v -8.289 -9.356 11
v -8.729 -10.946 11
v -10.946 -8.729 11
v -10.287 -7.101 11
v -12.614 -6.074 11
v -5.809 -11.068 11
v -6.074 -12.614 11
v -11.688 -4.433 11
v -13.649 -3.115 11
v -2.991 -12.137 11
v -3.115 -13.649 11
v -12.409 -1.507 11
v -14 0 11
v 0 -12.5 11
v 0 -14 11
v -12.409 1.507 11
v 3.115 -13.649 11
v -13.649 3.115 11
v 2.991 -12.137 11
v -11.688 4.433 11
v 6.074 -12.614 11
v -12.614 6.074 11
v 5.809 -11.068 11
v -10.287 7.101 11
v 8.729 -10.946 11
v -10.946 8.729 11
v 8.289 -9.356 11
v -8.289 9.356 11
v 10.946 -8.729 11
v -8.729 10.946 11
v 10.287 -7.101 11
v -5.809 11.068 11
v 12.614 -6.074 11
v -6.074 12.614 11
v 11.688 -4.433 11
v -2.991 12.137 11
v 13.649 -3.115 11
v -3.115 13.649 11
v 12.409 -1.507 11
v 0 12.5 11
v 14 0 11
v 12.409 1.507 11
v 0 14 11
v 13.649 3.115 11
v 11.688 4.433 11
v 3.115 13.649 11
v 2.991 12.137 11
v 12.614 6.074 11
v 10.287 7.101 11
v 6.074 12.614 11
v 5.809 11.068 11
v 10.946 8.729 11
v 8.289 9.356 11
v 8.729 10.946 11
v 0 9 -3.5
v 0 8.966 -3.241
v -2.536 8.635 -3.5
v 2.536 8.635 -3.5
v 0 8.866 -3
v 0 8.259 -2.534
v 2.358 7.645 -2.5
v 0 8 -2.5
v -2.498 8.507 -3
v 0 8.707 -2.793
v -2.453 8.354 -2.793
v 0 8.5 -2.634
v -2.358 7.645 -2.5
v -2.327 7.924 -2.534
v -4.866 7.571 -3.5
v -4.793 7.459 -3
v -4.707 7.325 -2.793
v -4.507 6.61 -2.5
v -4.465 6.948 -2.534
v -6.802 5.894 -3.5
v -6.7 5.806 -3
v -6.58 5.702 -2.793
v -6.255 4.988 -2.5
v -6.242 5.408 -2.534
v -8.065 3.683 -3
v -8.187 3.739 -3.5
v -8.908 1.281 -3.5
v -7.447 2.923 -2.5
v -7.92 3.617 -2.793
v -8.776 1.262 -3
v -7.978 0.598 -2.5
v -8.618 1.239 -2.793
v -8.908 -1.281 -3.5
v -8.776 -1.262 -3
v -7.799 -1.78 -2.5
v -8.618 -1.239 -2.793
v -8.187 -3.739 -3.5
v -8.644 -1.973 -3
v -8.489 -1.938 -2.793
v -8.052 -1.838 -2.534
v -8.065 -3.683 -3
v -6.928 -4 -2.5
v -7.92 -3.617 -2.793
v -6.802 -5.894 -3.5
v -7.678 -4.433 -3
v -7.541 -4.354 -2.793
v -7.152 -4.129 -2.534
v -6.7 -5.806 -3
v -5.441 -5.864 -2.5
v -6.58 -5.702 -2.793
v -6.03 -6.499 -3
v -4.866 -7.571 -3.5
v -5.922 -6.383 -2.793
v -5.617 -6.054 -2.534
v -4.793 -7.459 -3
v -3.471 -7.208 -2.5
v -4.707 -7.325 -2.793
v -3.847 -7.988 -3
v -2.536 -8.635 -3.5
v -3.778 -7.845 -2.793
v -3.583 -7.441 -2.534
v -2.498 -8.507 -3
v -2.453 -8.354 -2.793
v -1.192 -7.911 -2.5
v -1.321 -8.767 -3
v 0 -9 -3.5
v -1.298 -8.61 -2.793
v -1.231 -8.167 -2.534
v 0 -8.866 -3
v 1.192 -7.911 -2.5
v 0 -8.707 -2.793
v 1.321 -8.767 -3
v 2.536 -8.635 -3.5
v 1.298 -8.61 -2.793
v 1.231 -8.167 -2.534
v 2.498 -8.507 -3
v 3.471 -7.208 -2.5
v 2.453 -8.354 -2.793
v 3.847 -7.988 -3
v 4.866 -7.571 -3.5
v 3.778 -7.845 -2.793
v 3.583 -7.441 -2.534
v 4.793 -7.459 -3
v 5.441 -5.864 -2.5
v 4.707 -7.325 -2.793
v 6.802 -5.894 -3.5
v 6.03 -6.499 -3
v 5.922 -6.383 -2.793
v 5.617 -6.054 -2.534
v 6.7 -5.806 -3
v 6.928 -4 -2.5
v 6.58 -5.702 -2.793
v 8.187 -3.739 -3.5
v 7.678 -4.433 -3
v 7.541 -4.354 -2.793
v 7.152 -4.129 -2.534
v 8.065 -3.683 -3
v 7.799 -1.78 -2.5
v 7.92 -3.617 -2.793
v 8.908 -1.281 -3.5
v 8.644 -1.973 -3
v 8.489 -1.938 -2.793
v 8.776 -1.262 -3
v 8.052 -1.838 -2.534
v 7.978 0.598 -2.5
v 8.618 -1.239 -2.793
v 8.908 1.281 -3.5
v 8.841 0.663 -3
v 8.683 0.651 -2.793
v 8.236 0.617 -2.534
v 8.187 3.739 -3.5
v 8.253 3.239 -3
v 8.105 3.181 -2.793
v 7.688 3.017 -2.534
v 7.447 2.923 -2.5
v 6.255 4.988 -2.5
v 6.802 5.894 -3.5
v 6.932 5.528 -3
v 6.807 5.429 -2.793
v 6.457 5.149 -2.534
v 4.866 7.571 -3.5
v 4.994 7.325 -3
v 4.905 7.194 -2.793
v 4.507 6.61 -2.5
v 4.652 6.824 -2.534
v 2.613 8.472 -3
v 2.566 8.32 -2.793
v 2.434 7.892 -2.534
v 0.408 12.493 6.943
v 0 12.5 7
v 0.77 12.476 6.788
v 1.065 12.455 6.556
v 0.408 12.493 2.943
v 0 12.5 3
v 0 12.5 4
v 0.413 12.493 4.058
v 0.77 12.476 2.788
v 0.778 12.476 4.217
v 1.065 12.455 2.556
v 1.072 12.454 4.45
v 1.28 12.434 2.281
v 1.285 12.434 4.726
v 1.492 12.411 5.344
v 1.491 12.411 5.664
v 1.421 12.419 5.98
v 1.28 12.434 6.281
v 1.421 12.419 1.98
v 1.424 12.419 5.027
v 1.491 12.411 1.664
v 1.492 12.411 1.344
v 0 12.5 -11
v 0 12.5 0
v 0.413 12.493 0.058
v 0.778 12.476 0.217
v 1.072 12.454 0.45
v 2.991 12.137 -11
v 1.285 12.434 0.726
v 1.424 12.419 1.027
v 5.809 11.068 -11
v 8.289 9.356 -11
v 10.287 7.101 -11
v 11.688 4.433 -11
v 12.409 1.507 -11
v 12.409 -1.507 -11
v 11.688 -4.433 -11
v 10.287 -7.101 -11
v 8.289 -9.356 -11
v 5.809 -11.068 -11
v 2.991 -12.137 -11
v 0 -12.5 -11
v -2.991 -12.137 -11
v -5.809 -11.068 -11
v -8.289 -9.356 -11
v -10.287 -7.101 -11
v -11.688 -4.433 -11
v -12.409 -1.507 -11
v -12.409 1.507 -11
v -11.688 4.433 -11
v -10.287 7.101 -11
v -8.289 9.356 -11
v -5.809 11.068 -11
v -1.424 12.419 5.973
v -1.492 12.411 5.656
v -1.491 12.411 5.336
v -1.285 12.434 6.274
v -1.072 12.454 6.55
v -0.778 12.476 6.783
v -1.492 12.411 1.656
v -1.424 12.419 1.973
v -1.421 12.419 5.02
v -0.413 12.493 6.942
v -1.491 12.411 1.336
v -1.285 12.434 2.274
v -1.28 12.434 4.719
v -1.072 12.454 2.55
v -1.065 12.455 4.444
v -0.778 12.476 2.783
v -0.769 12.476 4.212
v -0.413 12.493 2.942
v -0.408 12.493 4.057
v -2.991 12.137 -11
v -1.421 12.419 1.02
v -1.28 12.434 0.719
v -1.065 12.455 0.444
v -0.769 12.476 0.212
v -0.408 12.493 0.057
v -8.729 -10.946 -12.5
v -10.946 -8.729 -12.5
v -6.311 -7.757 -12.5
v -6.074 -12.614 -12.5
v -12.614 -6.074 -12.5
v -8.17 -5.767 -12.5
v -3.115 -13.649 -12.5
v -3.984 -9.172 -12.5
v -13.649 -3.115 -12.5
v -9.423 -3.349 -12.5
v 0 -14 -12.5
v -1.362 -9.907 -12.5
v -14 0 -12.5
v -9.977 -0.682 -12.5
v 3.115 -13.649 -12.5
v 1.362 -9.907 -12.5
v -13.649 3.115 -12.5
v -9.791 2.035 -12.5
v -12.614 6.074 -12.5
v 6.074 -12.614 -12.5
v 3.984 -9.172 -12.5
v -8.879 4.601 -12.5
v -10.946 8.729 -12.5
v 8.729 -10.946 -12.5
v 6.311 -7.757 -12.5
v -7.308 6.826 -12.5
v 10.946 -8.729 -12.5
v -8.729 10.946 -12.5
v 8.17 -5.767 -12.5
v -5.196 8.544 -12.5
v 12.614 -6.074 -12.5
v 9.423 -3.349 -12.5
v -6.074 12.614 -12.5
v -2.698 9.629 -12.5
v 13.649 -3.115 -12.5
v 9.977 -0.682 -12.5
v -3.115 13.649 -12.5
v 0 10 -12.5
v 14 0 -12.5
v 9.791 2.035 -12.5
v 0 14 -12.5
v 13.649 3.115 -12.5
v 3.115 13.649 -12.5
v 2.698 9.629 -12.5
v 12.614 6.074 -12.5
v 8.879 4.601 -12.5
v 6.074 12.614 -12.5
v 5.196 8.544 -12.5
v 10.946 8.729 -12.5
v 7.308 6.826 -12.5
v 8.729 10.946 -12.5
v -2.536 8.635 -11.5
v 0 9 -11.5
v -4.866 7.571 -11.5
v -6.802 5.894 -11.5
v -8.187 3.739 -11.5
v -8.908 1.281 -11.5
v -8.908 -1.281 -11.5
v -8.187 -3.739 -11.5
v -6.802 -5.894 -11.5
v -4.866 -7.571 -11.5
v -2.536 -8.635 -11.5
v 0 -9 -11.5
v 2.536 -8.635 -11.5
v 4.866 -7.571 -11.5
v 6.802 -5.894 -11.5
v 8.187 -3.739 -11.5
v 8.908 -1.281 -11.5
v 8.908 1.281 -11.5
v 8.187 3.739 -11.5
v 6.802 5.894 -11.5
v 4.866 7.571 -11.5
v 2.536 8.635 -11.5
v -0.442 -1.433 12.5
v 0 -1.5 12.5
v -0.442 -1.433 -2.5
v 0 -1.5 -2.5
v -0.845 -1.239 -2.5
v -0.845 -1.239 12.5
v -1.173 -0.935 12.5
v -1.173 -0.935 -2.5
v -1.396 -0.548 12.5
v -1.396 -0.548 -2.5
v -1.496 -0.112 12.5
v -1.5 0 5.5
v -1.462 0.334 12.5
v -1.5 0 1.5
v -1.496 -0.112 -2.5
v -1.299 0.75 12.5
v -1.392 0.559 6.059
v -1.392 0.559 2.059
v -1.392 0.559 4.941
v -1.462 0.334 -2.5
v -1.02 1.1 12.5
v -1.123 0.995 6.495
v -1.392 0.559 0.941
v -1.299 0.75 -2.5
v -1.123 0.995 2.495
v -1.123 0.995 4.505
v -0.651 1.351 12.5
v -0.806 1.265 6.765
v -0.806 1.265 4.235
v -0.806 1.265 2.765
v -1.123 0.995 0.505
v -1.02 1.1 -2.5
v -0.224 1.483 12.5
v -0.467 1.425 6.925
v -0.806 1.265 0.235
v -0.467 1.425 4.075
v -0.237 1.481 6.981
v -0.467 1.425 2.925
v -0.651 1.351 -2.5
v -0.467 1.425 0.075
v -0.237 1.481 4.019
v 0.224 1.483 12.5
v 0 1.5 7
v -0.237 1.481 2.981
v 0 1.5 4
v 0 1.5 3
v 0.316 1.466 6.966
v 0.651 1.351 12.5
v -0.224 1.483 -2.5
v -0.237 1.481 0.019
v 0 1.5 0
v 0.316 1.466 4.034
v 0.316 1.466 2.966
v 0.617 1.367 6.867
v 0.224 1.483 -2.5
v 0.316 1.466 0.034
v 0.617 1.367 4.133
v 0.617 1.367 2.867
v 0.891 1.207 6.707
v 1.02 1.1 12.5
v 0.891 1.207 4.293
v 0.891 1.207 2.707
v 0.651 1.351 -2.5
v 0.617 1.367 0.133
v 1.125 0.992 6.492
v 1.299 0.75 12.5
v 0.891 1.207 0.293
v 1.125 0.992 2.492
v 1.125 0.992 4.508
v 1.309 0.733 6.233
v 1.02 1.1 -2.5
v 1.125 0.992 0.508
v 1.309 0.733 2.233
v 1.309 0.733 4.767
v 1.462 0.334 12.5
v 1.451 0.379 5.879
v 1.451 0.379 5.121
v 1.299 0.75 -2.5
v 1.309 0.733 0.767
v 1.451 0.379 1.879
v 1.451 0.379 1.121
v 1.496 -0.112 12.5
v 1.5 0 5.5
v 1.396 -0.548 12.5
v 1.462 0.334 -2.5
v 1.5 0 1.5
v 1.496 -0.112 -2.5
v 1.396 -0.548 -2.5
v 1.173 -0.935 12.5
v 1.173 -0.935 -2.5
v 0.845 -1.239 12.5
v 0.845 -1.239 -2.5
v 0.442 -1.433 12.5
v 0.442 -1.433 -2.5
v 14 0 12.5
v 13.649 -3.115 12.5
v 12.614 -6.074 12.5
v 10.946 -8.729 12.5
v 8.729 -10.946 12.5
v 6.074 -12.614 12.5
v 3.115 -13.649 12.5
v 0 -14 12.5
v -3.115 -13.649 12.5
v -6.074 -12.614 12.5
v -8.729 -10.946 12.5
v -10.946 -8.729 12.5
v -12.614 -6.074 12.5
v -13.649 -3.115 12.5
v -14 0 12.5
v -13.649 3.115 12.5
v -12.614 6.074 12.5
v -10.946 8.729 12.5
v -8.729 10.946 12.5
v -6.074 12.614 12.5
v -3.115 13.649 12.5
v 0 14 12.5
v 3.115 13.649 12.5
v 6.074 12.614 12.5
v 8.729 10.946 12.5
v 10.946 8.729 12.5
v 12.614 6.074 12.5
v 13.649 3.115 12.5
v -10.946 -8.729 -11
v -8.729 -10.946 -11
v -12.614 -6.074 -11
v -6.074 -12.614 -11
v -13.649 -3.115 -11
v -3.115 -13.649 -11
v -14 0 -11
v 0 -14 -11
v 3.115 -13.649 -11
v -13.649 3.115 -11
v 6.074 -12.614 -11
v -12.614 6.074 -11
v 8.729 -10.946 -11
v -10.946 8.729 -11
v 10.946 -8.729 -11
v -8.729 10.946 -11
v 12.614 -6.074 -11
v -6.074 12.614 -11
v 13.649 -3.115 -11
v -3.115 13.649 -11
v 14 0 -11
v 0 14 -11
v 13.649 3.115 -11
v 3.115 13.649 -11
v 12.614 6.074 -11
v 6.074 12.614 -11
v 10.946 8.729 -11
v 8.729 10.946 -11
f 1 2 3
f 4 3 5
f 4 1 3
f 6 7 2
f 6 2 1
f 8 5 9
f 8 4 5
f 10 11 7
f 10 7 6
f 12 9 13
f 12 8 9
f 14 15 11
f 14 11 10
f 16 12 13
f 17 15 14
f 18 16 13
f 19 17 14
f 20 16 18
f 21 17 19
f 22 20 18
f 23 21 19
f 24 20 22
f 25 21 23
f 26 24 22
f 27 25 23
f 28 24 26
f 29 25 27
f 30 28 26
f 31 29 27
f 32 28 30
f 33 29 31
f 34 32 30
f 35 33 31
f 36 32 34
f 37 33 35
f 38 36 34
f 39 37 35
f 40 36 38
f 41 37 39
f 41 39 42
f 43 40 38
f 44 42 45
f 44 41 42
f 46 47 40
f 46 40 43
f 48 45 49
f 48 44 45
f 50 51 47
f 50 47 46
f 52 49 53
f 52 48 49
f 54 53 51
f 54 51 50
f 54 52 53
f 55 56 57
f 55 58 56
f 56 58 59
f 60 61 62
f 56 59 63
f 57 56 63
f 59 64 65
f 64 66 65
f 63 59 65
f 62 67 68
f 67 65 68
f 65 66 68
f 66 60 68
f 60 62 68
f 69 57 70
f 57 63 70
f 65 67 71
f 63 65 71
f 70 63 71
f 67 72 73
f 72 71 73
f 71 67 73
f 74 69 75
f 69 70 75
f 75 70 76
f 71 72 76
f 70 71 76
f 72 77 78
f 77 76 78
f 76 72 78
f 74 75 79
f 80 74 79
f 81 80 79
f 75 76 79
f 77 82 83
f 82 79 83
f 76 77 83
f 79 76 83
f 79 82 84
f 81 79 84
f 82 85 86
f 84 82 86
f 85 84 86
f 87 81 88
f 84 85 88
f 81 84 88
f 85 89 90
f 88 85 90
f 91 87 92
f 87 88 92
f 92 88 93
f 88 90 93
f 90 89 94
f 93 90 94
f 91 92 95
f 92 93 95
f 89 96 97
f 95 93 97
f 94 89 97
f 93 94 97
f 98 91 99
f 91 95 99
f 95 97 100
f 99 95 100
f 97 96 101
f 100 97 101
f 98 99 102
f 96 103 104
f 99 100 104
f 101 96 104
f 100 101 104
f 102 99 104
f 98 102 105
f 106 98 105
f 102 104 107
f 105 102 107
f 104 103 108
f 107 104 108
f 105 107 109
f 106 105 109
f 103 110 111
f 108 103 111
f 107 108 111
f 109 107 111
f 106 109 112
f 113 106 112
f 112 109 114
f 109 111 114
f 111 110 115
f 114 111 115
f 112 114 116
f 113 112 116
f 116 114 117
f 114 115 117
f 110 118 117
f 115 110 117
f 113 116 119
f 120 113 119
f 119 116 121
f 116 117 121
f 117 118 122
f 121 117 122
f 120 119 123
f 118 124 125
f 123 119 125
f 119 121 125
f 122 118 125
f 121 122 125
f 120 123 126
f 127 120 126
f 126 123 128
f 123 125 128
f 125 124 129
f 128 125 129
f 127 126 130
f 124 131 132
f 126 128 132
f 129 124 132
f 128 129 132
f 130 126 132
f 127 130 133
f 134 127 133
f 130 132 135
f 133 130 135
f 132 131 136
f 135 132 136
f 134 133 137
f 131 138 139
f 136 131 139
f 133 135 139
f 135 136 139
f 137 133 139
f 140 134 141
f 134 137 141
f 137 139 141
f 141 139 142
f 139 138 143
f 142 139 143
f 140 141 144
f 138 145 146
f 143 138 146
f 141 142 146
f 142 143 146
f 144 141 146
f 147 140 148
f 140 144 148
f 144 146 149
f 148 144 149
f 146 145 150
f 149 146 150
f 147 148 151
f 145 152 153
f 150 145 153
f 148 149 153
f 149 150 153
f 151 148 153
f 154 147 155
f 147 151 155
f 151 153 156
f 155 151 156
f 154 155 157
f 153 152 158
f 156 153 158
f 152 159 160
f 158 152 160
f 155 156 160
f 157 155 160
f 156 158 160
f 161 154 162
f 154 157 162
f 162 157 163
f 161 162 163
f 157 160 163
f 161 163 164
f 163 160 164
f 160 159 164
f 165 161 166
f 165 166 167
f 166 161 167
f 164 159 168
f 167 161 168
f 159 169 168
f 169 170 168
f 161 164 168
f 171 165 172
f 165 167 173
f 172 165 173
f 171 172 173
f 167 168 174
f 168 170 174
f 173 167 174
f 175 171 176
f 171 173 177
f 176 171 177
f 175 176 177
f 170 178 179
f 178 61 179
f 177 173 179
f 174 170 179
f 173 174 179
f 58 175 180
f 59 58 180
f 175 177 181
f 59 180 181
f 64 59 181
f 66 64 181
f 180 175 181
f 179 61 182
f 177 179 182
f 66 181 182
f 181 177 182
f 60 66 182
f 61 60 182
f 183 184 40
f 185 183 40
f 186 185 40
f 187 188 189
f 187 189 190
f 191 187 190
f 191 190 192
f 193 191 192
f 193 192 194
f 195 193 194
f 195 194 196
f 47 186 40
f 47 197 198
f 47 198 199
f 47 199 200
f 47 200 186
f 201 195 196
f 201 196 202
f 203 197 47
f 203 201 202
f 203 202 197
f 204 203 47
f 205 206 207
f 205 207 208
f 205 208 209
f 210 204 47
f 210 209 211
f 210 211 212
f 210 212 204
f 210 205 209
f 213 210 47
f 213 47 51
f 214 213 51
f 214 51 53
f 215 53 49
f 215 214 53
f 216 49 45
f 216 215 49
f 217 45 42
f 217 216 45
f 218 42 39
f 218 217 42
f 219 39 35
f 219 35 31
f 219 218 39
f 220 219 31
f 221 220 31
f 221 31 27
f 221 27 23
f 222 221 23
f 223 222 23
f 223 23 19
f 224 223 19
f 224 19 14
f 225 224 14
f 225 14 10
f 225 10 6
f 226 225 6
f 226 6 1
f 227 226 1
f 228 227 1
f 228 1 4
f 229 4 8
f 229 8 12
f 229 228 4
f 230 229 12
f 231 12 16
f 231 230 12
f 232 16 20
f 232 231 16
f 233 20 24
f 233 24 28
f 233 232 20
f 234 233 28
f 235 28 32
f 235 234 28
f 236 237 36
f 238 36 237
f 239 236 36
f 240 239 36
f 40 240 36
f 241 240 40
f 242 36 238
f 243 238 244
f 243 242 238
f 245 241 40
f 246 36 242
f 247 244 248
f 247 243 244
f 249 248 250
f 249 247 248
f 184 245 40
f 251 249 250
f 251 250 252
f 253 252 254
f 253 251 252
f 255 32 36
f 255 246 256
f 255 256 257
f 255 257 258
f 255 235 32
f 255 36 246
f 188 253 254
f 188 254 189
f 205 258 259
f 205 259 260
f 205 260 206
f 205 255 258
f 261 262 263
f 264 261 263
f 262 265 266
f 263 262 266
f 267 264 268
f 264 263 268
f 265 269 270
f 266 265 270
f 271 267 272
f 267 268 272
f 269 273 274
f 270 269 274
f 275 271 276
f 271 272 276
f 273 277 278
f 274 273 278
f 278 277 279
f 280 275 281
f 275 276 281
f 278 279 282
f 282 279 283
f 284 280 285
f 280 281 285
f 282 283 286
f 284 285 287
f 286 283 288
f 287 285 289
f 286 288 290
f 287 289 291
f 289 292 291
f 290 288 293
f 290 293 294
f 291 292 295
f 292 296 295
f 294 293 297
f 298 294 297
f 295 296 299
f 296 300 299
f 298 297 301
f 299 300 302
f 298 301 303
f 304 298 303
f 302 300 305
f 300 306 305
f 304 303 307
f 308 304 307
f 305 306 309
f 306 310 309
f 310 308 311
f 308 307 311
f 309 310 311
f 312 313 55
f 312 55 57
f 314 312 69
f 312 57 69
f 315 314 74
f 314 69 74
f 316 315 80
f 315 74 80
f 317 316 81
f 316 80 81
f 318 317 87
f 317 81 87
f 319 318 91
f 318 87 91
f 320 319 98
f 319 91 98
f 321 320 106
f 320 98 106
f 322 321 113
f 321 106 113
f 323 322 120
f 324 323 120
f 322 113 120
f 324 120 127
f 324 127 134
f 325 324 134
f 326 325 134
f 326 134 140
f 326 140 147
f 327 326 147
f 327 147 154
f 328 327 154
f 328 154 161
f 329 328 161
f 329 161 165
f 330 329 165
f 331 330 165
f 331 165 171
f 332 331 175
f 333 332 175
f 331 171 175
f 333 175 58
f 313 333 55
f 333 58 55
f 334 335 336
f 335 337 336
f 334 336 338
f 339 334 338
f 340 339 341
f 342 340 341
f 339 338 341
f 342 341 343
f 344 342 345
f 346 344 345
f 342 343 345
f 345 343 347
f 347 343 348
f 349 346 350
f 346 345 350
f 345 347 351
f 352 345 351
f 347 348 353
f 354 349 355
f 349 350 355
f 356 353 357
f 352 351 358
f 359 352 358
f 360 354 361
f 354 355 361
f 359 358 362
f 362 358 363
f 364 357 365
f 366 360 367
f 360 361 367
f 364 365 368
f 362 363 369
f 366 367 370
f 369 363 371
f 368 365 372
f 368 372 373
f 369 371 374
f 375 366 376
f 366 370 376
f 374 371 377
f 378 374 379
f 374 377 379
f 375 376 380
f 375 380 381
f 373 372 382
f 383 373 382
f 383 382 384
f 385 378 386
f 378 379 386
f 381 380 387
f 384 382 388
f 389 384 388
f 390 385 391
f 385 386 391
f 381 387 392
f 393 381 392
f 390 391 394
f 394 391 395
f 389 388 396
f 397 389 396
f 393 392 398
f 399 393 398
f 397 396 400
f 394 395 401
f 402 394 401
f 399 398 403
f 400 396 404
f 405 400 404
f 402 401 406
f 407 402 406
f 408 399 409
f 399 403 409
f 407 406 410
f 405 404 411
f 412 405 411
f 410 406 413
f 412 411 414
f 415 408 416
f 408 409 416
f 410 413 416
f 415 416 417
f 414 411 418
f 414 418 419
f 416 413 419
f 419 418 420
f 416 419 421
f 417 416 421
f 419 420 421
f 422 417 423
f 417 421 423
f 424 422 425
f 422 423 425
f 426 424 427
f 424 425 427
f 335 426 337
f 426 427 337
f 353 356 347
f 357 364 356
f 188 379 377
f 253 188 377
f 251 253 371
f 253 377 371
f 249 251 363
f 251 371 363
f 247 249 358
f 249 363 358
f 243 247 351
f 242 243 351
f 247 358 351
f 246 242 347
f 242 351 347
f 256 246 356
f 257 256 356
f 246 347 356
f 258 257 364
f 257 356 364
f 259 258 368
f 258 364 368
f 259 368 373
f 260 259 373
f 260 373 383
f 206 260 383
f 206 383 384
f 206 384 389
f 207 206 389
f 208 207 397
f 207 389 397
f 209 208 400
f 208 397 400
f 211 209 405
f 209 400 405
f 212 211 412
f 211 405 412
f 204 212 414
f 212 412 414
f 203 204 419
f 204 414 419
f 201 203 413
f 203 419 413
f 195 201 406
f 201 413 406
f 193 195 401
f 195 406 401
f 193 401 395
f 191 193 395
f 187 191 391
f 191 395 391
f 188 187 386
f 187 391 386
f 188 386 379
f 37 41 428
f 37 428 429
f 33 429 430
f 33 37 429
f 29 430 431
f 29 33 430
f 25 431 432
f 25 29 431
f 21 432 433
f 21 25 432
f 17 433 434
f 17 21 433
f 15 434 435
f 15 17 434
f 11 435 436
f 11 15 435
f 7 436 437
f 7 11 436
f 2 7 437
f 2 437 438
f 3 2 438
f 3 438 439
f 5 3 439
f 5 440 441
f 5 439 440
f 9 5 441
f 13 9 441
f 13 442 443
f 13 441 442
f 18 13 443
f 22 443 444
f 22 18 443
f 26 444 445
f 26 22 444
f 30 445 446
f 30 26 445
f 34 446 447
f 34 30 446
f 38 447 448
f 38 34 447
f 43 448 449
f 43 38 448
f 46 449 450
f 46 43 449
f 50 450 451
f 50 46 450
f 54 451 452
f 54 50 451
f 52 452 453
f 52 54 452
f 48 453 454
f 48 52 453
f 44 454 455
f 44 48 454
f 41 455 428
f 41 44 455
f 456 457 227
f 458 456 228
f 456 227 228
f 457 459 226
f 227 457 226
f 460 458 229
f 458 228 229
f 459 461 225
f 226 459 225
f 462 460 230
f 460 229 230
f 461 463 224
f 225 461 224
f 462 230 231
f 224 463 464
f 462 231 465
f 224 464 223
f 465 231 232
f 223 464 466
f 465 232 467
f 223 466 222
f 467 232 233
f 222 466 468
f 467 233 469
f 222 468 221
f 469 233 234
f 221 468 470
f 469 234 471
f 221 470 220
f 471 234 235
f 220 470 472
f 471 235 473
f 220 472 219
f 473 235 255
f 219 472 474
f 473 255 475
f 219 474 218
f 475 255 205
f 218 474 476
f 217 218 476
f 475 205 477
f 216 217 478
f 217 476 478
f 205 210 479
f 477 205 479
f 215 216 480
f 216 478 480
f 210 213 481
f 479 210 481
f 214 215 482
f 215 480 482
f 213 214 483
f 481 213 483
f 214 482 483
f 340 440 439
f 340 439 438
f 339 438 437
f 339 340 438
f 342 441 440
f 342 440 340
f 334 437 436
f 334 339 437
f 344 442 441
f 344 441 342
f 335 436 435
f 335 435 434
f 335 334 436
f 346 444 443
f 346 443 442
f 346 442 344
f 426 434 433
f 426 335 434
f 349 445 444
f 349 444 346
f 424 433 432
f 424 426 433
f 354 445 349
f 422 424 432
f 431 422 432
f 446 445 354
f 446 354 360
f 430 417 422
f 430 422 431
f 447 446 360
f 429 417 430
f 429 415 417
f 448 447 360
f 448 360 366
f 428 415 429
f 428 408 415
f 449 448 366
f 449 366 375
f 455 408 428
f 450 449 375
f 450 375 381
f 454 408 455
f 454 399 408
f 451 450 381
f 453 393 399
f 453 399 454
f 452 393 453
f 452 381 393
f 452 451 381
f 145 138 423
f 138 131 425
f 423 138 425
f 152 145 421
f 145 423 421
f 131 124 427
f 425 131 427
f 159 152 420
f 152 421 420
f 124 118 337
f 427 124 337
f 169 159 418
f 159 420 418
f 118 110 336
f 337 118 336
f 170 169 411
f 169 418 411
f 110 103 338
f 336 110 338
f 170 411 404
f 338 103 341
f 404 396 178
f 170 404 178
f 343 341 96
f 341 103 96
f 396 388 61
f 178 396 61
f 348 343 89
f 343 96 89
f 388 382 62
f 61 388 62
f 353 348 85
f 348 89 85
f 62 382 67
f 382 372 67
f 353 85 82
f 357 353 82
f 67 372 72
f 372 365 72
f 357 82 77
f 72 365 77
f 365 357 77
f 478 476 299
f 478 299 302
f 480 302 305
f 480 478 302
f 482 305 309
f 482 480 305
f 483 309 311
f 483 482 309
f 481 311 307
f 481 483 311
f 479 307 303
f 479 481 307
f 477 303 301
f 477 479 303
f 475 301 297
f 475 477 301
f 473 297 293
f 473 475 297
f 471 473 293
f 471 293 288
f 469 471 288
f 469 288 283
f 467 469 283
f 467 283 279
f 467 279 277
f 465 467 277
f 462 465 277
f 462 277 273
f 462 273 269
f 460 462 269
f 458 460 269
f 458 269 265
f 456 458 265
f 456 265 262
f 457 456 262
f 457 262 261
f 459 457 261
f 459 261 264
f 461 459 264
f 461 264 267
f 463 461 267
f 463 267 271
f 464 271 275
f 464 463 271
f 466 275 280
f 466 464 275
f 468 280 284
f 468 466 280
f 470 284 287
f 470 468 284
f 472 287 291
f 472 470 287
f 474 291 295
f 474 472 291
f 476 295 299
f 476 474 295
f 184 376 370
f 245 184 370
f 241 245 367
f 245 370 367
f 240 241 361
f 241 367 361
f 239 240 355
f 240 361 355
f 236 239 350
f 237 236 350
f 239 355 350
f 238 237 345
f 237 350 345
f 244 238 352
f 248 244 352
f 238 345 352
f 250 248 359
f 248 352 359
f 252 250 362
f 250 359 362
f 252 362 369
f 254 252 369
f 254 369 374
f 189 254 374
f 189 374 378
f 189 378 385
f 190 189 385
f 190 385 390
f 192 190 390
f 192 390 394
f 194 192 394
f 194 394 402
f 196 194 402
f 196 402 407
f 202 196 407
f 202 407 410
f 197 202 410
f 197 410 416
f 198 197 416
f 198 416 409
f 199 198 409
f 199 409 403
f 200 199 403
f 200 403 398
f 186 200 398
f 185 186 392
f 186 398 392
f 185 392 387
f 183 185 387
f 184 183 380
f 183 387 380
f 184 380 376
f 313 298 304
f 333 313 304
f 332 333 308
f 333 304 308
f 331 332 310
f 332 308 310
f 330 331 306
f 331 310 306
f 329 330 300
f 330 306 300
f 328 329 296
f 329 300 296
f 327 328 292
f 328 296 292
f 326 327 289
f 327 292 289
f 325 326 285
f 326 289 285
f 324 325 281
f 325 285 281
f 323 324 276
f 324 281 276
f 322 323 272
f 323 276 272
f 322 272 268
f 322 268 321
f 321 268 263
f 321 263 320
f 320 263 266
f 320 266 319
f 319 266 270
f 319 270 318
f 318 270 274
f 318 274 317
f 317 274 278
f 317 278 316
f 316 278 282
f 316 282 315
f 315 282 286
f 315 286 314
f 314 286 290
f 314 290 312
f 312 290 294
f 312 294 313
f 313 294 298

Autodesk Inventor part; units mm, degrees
ref_plane "YZ Plane" through (0, 0, 0) normal (1, 0, 0) x (0, 1, 0)
ref_plane "XZ Plane" through (0, 0, 0) normal (0, 1, 0) x (-1, 0, 0)
sketch "Náčrt1" plane through (0, 0, 0) normal (0, 0, 1) x (1, 0, 0)
  circle A0 centre (0, 0) radius 14
  dimension "d0" = 28
extrude "Vysunutí1" add sketch "Náčrt1" along normal mid plane 25
sketch "Náčrt2" plane through (0, 0, 0) normal (1, 0, 0) x (0, 1, 0)
  line L0 (-14, -12.5) -> (14, -12.5) projected
  line L1 (14, 12.5) -> (-14, 12.5) projected
  line L2 (14, -12.5) -> (14, 12.5) projected
  line L3 (14, 11) -> (12.5, 11)
  line L4 (12.5, 11) -> (12.5, -11)
  line L5 (12.5, -11) -> (14, -11)
  line L6 (14, -11) -> (14, 11)
  line L7 (14, 0) -> (-14, 0) construction
  line L8 (-14, -12.5) -> (-14, 12.5) projected
  line L9 (0, 12.5) -> (0, -12.5) construction
  point P0 (0, 0)
  point P1 (14, -11)
  dimension "d4" = 11
  dimension "d5" = 12.5
revolve "Rotace1" cut sketch "Náčrt2" angle 360 about axis through (0, 0, 12.5) along (0, 0, -1) contours L5 L4 L3 L2
sketch "Náčrt3" plane through (0, 0, -12.5) normal (0, 0, -1) x (-1, 0, 0)
  line L0 (-6, 5) -> (6, 5)
  line L1 (6, 5) -> (6, -5)
  line L2 (6, -5) -> (-6, -5)
  line L3 (-6, -5) -> (-6, 5)
  line L4 (-6, 5) -> (6, -5) construction
  line L5 (6, 5) -> (-6, -5) construction
  circle A0 centre (0, 0) radius 9
  dimension "d7" = 12
  dimension "d8" = 10
  dimension "d9" = 18
hole "Díra1" at (0, 0, -12.5) direction (0, 0, 1) diameter 18 depth 10
sketch "Náčrt4" plane through (0, 0, 12.5) normal (0, 0, 1) x (1, 0, 0)
  circle A0 centre (0, 0) radius 14 projected
hole "Díra2" at (0, 0, 12.5) direction (0, 0, -1) diameter 3 end through all
ref_plane "Pracovní rovina1" through (0, 12.5, 0) normal (0, -1, 0) x (1, 0, 0)
sketch "Náčrt5" plane through (0, 12.5, 0) normal (0, -1, 0) x (1, 0, 0)
  line L0 (1.5, -2.5) -> (-1.5, -2.5) projected
  line L1 (-9, -2.5) -> (9, -2.5) projected
  line L2 (0, 0) -> (0, -10.7479) construction
  point P0 (0, 1.5)
  point P1 (0, 5.5)
  dimension "d24" = 4
  dimension "d25" = 4
hole "Díra3" at (0, 12.5, 1.5) at (0, 12.5, 5.5) direction (0, -1, 0) diameter 3 depth 12.5
thread "Závit1" size "M3x0.5" class "6H" standard "ISO Metric profile" full length
thread "Závit2" size "M3x0.5" class "6H" standard "ISO Metric profile" full length
chamfer "Zkosení1" distance 1 angle 45 1 edges at (0, -9, -12.5)
fillet "Zaoblení1" radius 1 1 edges at (0, -9, -2.5)
properties part number "Wheel"
